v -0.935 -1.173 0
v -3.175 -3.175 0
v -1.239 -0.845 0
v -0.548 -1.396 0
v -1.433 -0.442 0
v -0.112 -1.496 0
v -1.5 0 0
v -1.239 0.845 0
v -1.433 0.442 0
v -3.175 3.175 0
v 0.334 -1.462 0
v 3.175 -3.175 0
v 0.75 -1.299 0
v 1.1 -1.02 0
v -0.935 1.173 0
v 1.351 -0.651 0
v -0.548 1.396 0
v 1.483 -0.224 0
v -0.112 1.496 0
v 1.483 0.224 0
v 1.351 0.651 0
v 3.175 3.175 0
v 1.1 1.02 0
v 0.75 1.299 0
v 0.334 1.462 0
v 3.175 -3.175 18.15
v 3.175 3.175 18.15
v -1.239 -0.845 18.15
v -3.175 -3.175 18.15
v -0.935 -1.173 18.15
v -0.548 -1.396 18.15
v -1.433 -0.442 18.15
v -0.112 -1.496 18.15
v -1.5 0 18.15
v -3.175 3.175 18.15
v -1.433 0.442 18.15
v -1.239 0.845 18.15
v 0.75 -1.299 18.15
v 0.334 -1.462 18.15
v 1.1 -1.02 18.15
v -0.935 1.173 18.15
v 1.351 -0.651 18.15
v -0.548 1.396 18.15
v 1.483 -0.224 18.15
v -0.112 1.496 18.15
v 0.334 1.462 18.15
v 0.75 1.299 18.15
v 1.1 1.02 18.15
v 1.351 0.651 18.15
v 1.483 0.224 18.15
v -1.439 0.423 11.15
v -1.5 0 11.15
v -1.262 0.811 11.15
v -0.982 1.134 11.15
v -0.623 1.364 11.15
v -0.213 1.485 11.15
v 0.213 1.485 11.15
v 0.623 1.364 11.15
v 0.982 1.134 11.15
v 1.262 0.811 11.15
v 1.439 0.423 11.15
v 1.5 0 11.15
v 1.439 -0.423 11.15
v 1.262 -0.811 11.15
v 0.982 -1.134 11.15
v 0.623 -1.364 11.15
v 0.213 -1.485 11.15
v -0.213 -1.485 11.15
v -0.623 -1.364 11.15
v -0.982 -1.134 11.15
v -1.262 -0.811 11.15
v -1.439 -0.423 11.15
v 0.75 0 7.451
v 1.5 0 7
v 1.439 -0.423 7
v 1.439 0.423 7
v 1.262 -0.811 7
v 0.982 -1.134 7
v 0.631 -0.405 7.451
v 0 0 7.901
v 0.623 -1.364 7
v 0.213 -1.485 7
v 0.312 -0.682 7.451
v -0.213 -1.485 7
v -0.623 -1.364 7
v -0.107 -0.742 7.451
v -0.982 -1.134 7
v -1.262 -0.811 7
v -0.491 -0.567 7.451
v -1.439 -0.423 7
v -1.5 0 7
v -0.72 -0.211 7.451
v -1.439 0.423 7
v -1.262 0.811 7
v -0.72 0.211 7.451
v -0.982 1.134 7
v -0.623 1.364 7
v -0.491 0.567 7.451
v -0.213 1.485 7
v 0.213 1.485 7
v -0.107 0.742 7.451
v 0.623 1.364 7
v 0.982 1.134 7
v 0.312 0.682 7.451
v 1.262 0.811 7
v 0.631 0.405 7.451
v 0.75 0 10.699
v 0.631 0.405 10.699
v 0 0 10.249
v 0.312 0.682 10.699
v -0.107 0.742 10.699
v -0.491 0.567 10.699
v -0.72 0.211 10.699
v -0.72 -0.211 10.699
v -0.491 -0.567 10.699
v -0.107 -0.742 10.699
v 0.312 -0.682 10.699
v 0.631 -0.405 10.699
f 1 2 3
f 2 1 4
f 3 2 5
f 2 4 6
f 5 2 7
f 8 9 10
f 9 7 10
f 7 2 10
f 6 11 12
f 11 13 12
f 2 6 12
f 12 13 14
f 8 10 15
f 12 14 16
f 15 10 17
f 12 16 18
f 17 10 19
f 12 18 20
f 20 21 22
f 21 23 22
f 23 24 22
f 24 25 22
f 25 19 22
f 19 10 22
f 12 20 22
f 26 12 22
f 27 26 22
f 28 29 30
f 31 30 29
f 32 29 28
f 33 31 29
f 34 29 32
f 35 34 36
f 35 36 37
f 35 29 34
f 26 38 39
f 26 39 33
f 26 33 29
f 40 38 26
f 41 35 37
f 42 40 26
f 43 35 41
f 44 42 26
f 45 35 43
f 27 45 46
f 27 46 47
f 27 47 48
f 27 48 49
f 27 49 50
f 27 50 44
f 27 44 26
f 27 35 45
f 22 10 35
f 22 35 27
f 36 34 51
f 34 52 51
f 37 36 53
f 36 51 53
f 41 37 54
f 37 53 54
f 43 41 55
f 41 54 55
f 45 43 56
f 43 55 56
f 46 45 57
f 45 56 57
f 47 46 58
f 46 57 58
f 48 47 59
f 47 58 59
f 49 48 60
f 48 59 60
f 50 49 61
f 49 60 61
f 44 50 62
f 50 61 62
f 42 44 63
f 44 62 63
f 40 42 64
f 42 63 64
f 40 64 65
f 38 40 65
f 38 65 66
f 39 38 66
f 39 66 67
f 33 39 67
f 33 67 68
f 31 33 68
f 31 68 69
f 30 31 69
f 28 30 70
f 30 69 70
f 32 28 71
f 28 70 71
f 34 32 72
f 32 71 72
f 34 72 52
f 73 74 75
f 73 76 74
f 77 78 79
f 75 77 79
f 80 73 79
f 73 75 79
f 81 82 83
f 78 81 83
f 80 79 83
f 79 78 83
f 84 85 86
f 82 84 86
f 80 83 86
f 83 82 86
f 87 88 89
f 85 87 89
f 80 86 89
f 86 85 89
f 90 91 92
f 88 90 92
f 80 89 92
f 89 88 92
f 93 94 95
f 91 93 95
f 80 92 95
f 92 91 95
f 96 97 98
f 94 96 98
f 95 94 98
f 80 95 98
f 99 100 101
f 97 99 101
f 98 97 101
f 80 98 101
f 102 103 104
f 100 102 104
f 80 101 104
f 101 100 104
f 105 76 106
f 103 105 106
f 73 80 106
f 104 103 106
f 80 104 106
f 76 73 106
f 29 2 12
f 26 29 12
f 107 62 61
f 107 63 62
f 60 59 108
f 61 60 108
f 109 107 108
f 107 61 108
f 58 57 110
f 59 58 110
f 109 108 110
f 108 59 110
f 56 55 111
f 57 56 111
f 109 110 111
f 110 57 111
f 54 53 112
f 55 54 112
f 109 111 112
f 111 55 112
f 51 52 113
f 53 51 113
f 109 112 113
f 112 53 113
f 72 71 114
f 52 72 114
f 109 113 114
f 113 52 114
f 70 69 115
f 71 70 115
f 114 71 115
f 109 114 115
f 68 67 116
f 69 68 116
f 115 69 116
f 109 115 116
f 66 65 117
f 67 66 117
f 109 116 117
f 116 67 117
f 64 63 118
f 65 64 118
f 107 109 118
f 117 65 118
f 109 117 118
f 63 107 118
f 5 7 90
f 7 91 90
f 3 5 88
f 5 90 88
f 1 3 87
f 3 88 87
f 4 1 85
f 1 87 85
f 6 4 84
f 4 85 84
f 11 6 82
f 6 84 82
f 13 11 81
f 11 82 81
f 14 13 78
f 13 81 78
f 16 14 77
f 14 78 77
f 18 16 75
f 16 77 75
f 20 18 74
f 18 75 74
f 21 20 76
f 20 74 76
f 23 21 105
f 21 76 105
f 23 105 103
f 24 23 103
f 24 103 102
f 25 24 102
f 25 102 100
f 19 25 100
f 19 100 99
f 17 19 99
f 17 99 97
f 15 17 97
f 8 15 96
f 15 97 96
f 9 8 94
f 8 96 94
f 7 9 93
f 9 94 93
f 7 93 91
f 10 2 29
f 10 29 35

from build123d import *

# Parameters (mm, degrees)
F0_W     = 6.35
F0_H     = 6.35
F1_DEPTH = 18.15
F2_D     = 3
F2_DEPTH = 7
F2_TIP   = 0.9012909285
F4_D     = 3
F4_DEPTH = 7
F4_TIP   = 0.9012909285


with BuildPart() as f1:
    # F0 (on Top) → F1 (new body)
    with BuildSketch(Plane.XY):
        Rectangle(F0_W, F0_H)
    extrude(amount=F1_DEPTH)

    # F2
    with Locations(Plane(origin=(0, 0, 0), x_dir=(1, 0, 0), z_dir=(0, 0, -1))):
        with Locations((0, 0)):
            Hole(F2_D / 2, depth=F2_DEPTH)
            with Locations((0, 0, -(F2_DEPTH + F2_TIP / 2))):  # 118° drill point
                Cone(0, F2_D / 2, F2_TIP, mode=Mode.SUBTRACT)

    # F4
    with Locations(Plane.XY.offset(18.15)):
        with Locations((0, 0)):
            Hole(F4_D / 2, depth=F4_DEPTH)
            with Locations((0, 0, -(F4_DEPTH + F4_TIP / 2))):  # 118° drill point
                Cone(0, F4_D / 2, F4_TIP, mode=Mode.SUBTRACT)


solid = f1.part
